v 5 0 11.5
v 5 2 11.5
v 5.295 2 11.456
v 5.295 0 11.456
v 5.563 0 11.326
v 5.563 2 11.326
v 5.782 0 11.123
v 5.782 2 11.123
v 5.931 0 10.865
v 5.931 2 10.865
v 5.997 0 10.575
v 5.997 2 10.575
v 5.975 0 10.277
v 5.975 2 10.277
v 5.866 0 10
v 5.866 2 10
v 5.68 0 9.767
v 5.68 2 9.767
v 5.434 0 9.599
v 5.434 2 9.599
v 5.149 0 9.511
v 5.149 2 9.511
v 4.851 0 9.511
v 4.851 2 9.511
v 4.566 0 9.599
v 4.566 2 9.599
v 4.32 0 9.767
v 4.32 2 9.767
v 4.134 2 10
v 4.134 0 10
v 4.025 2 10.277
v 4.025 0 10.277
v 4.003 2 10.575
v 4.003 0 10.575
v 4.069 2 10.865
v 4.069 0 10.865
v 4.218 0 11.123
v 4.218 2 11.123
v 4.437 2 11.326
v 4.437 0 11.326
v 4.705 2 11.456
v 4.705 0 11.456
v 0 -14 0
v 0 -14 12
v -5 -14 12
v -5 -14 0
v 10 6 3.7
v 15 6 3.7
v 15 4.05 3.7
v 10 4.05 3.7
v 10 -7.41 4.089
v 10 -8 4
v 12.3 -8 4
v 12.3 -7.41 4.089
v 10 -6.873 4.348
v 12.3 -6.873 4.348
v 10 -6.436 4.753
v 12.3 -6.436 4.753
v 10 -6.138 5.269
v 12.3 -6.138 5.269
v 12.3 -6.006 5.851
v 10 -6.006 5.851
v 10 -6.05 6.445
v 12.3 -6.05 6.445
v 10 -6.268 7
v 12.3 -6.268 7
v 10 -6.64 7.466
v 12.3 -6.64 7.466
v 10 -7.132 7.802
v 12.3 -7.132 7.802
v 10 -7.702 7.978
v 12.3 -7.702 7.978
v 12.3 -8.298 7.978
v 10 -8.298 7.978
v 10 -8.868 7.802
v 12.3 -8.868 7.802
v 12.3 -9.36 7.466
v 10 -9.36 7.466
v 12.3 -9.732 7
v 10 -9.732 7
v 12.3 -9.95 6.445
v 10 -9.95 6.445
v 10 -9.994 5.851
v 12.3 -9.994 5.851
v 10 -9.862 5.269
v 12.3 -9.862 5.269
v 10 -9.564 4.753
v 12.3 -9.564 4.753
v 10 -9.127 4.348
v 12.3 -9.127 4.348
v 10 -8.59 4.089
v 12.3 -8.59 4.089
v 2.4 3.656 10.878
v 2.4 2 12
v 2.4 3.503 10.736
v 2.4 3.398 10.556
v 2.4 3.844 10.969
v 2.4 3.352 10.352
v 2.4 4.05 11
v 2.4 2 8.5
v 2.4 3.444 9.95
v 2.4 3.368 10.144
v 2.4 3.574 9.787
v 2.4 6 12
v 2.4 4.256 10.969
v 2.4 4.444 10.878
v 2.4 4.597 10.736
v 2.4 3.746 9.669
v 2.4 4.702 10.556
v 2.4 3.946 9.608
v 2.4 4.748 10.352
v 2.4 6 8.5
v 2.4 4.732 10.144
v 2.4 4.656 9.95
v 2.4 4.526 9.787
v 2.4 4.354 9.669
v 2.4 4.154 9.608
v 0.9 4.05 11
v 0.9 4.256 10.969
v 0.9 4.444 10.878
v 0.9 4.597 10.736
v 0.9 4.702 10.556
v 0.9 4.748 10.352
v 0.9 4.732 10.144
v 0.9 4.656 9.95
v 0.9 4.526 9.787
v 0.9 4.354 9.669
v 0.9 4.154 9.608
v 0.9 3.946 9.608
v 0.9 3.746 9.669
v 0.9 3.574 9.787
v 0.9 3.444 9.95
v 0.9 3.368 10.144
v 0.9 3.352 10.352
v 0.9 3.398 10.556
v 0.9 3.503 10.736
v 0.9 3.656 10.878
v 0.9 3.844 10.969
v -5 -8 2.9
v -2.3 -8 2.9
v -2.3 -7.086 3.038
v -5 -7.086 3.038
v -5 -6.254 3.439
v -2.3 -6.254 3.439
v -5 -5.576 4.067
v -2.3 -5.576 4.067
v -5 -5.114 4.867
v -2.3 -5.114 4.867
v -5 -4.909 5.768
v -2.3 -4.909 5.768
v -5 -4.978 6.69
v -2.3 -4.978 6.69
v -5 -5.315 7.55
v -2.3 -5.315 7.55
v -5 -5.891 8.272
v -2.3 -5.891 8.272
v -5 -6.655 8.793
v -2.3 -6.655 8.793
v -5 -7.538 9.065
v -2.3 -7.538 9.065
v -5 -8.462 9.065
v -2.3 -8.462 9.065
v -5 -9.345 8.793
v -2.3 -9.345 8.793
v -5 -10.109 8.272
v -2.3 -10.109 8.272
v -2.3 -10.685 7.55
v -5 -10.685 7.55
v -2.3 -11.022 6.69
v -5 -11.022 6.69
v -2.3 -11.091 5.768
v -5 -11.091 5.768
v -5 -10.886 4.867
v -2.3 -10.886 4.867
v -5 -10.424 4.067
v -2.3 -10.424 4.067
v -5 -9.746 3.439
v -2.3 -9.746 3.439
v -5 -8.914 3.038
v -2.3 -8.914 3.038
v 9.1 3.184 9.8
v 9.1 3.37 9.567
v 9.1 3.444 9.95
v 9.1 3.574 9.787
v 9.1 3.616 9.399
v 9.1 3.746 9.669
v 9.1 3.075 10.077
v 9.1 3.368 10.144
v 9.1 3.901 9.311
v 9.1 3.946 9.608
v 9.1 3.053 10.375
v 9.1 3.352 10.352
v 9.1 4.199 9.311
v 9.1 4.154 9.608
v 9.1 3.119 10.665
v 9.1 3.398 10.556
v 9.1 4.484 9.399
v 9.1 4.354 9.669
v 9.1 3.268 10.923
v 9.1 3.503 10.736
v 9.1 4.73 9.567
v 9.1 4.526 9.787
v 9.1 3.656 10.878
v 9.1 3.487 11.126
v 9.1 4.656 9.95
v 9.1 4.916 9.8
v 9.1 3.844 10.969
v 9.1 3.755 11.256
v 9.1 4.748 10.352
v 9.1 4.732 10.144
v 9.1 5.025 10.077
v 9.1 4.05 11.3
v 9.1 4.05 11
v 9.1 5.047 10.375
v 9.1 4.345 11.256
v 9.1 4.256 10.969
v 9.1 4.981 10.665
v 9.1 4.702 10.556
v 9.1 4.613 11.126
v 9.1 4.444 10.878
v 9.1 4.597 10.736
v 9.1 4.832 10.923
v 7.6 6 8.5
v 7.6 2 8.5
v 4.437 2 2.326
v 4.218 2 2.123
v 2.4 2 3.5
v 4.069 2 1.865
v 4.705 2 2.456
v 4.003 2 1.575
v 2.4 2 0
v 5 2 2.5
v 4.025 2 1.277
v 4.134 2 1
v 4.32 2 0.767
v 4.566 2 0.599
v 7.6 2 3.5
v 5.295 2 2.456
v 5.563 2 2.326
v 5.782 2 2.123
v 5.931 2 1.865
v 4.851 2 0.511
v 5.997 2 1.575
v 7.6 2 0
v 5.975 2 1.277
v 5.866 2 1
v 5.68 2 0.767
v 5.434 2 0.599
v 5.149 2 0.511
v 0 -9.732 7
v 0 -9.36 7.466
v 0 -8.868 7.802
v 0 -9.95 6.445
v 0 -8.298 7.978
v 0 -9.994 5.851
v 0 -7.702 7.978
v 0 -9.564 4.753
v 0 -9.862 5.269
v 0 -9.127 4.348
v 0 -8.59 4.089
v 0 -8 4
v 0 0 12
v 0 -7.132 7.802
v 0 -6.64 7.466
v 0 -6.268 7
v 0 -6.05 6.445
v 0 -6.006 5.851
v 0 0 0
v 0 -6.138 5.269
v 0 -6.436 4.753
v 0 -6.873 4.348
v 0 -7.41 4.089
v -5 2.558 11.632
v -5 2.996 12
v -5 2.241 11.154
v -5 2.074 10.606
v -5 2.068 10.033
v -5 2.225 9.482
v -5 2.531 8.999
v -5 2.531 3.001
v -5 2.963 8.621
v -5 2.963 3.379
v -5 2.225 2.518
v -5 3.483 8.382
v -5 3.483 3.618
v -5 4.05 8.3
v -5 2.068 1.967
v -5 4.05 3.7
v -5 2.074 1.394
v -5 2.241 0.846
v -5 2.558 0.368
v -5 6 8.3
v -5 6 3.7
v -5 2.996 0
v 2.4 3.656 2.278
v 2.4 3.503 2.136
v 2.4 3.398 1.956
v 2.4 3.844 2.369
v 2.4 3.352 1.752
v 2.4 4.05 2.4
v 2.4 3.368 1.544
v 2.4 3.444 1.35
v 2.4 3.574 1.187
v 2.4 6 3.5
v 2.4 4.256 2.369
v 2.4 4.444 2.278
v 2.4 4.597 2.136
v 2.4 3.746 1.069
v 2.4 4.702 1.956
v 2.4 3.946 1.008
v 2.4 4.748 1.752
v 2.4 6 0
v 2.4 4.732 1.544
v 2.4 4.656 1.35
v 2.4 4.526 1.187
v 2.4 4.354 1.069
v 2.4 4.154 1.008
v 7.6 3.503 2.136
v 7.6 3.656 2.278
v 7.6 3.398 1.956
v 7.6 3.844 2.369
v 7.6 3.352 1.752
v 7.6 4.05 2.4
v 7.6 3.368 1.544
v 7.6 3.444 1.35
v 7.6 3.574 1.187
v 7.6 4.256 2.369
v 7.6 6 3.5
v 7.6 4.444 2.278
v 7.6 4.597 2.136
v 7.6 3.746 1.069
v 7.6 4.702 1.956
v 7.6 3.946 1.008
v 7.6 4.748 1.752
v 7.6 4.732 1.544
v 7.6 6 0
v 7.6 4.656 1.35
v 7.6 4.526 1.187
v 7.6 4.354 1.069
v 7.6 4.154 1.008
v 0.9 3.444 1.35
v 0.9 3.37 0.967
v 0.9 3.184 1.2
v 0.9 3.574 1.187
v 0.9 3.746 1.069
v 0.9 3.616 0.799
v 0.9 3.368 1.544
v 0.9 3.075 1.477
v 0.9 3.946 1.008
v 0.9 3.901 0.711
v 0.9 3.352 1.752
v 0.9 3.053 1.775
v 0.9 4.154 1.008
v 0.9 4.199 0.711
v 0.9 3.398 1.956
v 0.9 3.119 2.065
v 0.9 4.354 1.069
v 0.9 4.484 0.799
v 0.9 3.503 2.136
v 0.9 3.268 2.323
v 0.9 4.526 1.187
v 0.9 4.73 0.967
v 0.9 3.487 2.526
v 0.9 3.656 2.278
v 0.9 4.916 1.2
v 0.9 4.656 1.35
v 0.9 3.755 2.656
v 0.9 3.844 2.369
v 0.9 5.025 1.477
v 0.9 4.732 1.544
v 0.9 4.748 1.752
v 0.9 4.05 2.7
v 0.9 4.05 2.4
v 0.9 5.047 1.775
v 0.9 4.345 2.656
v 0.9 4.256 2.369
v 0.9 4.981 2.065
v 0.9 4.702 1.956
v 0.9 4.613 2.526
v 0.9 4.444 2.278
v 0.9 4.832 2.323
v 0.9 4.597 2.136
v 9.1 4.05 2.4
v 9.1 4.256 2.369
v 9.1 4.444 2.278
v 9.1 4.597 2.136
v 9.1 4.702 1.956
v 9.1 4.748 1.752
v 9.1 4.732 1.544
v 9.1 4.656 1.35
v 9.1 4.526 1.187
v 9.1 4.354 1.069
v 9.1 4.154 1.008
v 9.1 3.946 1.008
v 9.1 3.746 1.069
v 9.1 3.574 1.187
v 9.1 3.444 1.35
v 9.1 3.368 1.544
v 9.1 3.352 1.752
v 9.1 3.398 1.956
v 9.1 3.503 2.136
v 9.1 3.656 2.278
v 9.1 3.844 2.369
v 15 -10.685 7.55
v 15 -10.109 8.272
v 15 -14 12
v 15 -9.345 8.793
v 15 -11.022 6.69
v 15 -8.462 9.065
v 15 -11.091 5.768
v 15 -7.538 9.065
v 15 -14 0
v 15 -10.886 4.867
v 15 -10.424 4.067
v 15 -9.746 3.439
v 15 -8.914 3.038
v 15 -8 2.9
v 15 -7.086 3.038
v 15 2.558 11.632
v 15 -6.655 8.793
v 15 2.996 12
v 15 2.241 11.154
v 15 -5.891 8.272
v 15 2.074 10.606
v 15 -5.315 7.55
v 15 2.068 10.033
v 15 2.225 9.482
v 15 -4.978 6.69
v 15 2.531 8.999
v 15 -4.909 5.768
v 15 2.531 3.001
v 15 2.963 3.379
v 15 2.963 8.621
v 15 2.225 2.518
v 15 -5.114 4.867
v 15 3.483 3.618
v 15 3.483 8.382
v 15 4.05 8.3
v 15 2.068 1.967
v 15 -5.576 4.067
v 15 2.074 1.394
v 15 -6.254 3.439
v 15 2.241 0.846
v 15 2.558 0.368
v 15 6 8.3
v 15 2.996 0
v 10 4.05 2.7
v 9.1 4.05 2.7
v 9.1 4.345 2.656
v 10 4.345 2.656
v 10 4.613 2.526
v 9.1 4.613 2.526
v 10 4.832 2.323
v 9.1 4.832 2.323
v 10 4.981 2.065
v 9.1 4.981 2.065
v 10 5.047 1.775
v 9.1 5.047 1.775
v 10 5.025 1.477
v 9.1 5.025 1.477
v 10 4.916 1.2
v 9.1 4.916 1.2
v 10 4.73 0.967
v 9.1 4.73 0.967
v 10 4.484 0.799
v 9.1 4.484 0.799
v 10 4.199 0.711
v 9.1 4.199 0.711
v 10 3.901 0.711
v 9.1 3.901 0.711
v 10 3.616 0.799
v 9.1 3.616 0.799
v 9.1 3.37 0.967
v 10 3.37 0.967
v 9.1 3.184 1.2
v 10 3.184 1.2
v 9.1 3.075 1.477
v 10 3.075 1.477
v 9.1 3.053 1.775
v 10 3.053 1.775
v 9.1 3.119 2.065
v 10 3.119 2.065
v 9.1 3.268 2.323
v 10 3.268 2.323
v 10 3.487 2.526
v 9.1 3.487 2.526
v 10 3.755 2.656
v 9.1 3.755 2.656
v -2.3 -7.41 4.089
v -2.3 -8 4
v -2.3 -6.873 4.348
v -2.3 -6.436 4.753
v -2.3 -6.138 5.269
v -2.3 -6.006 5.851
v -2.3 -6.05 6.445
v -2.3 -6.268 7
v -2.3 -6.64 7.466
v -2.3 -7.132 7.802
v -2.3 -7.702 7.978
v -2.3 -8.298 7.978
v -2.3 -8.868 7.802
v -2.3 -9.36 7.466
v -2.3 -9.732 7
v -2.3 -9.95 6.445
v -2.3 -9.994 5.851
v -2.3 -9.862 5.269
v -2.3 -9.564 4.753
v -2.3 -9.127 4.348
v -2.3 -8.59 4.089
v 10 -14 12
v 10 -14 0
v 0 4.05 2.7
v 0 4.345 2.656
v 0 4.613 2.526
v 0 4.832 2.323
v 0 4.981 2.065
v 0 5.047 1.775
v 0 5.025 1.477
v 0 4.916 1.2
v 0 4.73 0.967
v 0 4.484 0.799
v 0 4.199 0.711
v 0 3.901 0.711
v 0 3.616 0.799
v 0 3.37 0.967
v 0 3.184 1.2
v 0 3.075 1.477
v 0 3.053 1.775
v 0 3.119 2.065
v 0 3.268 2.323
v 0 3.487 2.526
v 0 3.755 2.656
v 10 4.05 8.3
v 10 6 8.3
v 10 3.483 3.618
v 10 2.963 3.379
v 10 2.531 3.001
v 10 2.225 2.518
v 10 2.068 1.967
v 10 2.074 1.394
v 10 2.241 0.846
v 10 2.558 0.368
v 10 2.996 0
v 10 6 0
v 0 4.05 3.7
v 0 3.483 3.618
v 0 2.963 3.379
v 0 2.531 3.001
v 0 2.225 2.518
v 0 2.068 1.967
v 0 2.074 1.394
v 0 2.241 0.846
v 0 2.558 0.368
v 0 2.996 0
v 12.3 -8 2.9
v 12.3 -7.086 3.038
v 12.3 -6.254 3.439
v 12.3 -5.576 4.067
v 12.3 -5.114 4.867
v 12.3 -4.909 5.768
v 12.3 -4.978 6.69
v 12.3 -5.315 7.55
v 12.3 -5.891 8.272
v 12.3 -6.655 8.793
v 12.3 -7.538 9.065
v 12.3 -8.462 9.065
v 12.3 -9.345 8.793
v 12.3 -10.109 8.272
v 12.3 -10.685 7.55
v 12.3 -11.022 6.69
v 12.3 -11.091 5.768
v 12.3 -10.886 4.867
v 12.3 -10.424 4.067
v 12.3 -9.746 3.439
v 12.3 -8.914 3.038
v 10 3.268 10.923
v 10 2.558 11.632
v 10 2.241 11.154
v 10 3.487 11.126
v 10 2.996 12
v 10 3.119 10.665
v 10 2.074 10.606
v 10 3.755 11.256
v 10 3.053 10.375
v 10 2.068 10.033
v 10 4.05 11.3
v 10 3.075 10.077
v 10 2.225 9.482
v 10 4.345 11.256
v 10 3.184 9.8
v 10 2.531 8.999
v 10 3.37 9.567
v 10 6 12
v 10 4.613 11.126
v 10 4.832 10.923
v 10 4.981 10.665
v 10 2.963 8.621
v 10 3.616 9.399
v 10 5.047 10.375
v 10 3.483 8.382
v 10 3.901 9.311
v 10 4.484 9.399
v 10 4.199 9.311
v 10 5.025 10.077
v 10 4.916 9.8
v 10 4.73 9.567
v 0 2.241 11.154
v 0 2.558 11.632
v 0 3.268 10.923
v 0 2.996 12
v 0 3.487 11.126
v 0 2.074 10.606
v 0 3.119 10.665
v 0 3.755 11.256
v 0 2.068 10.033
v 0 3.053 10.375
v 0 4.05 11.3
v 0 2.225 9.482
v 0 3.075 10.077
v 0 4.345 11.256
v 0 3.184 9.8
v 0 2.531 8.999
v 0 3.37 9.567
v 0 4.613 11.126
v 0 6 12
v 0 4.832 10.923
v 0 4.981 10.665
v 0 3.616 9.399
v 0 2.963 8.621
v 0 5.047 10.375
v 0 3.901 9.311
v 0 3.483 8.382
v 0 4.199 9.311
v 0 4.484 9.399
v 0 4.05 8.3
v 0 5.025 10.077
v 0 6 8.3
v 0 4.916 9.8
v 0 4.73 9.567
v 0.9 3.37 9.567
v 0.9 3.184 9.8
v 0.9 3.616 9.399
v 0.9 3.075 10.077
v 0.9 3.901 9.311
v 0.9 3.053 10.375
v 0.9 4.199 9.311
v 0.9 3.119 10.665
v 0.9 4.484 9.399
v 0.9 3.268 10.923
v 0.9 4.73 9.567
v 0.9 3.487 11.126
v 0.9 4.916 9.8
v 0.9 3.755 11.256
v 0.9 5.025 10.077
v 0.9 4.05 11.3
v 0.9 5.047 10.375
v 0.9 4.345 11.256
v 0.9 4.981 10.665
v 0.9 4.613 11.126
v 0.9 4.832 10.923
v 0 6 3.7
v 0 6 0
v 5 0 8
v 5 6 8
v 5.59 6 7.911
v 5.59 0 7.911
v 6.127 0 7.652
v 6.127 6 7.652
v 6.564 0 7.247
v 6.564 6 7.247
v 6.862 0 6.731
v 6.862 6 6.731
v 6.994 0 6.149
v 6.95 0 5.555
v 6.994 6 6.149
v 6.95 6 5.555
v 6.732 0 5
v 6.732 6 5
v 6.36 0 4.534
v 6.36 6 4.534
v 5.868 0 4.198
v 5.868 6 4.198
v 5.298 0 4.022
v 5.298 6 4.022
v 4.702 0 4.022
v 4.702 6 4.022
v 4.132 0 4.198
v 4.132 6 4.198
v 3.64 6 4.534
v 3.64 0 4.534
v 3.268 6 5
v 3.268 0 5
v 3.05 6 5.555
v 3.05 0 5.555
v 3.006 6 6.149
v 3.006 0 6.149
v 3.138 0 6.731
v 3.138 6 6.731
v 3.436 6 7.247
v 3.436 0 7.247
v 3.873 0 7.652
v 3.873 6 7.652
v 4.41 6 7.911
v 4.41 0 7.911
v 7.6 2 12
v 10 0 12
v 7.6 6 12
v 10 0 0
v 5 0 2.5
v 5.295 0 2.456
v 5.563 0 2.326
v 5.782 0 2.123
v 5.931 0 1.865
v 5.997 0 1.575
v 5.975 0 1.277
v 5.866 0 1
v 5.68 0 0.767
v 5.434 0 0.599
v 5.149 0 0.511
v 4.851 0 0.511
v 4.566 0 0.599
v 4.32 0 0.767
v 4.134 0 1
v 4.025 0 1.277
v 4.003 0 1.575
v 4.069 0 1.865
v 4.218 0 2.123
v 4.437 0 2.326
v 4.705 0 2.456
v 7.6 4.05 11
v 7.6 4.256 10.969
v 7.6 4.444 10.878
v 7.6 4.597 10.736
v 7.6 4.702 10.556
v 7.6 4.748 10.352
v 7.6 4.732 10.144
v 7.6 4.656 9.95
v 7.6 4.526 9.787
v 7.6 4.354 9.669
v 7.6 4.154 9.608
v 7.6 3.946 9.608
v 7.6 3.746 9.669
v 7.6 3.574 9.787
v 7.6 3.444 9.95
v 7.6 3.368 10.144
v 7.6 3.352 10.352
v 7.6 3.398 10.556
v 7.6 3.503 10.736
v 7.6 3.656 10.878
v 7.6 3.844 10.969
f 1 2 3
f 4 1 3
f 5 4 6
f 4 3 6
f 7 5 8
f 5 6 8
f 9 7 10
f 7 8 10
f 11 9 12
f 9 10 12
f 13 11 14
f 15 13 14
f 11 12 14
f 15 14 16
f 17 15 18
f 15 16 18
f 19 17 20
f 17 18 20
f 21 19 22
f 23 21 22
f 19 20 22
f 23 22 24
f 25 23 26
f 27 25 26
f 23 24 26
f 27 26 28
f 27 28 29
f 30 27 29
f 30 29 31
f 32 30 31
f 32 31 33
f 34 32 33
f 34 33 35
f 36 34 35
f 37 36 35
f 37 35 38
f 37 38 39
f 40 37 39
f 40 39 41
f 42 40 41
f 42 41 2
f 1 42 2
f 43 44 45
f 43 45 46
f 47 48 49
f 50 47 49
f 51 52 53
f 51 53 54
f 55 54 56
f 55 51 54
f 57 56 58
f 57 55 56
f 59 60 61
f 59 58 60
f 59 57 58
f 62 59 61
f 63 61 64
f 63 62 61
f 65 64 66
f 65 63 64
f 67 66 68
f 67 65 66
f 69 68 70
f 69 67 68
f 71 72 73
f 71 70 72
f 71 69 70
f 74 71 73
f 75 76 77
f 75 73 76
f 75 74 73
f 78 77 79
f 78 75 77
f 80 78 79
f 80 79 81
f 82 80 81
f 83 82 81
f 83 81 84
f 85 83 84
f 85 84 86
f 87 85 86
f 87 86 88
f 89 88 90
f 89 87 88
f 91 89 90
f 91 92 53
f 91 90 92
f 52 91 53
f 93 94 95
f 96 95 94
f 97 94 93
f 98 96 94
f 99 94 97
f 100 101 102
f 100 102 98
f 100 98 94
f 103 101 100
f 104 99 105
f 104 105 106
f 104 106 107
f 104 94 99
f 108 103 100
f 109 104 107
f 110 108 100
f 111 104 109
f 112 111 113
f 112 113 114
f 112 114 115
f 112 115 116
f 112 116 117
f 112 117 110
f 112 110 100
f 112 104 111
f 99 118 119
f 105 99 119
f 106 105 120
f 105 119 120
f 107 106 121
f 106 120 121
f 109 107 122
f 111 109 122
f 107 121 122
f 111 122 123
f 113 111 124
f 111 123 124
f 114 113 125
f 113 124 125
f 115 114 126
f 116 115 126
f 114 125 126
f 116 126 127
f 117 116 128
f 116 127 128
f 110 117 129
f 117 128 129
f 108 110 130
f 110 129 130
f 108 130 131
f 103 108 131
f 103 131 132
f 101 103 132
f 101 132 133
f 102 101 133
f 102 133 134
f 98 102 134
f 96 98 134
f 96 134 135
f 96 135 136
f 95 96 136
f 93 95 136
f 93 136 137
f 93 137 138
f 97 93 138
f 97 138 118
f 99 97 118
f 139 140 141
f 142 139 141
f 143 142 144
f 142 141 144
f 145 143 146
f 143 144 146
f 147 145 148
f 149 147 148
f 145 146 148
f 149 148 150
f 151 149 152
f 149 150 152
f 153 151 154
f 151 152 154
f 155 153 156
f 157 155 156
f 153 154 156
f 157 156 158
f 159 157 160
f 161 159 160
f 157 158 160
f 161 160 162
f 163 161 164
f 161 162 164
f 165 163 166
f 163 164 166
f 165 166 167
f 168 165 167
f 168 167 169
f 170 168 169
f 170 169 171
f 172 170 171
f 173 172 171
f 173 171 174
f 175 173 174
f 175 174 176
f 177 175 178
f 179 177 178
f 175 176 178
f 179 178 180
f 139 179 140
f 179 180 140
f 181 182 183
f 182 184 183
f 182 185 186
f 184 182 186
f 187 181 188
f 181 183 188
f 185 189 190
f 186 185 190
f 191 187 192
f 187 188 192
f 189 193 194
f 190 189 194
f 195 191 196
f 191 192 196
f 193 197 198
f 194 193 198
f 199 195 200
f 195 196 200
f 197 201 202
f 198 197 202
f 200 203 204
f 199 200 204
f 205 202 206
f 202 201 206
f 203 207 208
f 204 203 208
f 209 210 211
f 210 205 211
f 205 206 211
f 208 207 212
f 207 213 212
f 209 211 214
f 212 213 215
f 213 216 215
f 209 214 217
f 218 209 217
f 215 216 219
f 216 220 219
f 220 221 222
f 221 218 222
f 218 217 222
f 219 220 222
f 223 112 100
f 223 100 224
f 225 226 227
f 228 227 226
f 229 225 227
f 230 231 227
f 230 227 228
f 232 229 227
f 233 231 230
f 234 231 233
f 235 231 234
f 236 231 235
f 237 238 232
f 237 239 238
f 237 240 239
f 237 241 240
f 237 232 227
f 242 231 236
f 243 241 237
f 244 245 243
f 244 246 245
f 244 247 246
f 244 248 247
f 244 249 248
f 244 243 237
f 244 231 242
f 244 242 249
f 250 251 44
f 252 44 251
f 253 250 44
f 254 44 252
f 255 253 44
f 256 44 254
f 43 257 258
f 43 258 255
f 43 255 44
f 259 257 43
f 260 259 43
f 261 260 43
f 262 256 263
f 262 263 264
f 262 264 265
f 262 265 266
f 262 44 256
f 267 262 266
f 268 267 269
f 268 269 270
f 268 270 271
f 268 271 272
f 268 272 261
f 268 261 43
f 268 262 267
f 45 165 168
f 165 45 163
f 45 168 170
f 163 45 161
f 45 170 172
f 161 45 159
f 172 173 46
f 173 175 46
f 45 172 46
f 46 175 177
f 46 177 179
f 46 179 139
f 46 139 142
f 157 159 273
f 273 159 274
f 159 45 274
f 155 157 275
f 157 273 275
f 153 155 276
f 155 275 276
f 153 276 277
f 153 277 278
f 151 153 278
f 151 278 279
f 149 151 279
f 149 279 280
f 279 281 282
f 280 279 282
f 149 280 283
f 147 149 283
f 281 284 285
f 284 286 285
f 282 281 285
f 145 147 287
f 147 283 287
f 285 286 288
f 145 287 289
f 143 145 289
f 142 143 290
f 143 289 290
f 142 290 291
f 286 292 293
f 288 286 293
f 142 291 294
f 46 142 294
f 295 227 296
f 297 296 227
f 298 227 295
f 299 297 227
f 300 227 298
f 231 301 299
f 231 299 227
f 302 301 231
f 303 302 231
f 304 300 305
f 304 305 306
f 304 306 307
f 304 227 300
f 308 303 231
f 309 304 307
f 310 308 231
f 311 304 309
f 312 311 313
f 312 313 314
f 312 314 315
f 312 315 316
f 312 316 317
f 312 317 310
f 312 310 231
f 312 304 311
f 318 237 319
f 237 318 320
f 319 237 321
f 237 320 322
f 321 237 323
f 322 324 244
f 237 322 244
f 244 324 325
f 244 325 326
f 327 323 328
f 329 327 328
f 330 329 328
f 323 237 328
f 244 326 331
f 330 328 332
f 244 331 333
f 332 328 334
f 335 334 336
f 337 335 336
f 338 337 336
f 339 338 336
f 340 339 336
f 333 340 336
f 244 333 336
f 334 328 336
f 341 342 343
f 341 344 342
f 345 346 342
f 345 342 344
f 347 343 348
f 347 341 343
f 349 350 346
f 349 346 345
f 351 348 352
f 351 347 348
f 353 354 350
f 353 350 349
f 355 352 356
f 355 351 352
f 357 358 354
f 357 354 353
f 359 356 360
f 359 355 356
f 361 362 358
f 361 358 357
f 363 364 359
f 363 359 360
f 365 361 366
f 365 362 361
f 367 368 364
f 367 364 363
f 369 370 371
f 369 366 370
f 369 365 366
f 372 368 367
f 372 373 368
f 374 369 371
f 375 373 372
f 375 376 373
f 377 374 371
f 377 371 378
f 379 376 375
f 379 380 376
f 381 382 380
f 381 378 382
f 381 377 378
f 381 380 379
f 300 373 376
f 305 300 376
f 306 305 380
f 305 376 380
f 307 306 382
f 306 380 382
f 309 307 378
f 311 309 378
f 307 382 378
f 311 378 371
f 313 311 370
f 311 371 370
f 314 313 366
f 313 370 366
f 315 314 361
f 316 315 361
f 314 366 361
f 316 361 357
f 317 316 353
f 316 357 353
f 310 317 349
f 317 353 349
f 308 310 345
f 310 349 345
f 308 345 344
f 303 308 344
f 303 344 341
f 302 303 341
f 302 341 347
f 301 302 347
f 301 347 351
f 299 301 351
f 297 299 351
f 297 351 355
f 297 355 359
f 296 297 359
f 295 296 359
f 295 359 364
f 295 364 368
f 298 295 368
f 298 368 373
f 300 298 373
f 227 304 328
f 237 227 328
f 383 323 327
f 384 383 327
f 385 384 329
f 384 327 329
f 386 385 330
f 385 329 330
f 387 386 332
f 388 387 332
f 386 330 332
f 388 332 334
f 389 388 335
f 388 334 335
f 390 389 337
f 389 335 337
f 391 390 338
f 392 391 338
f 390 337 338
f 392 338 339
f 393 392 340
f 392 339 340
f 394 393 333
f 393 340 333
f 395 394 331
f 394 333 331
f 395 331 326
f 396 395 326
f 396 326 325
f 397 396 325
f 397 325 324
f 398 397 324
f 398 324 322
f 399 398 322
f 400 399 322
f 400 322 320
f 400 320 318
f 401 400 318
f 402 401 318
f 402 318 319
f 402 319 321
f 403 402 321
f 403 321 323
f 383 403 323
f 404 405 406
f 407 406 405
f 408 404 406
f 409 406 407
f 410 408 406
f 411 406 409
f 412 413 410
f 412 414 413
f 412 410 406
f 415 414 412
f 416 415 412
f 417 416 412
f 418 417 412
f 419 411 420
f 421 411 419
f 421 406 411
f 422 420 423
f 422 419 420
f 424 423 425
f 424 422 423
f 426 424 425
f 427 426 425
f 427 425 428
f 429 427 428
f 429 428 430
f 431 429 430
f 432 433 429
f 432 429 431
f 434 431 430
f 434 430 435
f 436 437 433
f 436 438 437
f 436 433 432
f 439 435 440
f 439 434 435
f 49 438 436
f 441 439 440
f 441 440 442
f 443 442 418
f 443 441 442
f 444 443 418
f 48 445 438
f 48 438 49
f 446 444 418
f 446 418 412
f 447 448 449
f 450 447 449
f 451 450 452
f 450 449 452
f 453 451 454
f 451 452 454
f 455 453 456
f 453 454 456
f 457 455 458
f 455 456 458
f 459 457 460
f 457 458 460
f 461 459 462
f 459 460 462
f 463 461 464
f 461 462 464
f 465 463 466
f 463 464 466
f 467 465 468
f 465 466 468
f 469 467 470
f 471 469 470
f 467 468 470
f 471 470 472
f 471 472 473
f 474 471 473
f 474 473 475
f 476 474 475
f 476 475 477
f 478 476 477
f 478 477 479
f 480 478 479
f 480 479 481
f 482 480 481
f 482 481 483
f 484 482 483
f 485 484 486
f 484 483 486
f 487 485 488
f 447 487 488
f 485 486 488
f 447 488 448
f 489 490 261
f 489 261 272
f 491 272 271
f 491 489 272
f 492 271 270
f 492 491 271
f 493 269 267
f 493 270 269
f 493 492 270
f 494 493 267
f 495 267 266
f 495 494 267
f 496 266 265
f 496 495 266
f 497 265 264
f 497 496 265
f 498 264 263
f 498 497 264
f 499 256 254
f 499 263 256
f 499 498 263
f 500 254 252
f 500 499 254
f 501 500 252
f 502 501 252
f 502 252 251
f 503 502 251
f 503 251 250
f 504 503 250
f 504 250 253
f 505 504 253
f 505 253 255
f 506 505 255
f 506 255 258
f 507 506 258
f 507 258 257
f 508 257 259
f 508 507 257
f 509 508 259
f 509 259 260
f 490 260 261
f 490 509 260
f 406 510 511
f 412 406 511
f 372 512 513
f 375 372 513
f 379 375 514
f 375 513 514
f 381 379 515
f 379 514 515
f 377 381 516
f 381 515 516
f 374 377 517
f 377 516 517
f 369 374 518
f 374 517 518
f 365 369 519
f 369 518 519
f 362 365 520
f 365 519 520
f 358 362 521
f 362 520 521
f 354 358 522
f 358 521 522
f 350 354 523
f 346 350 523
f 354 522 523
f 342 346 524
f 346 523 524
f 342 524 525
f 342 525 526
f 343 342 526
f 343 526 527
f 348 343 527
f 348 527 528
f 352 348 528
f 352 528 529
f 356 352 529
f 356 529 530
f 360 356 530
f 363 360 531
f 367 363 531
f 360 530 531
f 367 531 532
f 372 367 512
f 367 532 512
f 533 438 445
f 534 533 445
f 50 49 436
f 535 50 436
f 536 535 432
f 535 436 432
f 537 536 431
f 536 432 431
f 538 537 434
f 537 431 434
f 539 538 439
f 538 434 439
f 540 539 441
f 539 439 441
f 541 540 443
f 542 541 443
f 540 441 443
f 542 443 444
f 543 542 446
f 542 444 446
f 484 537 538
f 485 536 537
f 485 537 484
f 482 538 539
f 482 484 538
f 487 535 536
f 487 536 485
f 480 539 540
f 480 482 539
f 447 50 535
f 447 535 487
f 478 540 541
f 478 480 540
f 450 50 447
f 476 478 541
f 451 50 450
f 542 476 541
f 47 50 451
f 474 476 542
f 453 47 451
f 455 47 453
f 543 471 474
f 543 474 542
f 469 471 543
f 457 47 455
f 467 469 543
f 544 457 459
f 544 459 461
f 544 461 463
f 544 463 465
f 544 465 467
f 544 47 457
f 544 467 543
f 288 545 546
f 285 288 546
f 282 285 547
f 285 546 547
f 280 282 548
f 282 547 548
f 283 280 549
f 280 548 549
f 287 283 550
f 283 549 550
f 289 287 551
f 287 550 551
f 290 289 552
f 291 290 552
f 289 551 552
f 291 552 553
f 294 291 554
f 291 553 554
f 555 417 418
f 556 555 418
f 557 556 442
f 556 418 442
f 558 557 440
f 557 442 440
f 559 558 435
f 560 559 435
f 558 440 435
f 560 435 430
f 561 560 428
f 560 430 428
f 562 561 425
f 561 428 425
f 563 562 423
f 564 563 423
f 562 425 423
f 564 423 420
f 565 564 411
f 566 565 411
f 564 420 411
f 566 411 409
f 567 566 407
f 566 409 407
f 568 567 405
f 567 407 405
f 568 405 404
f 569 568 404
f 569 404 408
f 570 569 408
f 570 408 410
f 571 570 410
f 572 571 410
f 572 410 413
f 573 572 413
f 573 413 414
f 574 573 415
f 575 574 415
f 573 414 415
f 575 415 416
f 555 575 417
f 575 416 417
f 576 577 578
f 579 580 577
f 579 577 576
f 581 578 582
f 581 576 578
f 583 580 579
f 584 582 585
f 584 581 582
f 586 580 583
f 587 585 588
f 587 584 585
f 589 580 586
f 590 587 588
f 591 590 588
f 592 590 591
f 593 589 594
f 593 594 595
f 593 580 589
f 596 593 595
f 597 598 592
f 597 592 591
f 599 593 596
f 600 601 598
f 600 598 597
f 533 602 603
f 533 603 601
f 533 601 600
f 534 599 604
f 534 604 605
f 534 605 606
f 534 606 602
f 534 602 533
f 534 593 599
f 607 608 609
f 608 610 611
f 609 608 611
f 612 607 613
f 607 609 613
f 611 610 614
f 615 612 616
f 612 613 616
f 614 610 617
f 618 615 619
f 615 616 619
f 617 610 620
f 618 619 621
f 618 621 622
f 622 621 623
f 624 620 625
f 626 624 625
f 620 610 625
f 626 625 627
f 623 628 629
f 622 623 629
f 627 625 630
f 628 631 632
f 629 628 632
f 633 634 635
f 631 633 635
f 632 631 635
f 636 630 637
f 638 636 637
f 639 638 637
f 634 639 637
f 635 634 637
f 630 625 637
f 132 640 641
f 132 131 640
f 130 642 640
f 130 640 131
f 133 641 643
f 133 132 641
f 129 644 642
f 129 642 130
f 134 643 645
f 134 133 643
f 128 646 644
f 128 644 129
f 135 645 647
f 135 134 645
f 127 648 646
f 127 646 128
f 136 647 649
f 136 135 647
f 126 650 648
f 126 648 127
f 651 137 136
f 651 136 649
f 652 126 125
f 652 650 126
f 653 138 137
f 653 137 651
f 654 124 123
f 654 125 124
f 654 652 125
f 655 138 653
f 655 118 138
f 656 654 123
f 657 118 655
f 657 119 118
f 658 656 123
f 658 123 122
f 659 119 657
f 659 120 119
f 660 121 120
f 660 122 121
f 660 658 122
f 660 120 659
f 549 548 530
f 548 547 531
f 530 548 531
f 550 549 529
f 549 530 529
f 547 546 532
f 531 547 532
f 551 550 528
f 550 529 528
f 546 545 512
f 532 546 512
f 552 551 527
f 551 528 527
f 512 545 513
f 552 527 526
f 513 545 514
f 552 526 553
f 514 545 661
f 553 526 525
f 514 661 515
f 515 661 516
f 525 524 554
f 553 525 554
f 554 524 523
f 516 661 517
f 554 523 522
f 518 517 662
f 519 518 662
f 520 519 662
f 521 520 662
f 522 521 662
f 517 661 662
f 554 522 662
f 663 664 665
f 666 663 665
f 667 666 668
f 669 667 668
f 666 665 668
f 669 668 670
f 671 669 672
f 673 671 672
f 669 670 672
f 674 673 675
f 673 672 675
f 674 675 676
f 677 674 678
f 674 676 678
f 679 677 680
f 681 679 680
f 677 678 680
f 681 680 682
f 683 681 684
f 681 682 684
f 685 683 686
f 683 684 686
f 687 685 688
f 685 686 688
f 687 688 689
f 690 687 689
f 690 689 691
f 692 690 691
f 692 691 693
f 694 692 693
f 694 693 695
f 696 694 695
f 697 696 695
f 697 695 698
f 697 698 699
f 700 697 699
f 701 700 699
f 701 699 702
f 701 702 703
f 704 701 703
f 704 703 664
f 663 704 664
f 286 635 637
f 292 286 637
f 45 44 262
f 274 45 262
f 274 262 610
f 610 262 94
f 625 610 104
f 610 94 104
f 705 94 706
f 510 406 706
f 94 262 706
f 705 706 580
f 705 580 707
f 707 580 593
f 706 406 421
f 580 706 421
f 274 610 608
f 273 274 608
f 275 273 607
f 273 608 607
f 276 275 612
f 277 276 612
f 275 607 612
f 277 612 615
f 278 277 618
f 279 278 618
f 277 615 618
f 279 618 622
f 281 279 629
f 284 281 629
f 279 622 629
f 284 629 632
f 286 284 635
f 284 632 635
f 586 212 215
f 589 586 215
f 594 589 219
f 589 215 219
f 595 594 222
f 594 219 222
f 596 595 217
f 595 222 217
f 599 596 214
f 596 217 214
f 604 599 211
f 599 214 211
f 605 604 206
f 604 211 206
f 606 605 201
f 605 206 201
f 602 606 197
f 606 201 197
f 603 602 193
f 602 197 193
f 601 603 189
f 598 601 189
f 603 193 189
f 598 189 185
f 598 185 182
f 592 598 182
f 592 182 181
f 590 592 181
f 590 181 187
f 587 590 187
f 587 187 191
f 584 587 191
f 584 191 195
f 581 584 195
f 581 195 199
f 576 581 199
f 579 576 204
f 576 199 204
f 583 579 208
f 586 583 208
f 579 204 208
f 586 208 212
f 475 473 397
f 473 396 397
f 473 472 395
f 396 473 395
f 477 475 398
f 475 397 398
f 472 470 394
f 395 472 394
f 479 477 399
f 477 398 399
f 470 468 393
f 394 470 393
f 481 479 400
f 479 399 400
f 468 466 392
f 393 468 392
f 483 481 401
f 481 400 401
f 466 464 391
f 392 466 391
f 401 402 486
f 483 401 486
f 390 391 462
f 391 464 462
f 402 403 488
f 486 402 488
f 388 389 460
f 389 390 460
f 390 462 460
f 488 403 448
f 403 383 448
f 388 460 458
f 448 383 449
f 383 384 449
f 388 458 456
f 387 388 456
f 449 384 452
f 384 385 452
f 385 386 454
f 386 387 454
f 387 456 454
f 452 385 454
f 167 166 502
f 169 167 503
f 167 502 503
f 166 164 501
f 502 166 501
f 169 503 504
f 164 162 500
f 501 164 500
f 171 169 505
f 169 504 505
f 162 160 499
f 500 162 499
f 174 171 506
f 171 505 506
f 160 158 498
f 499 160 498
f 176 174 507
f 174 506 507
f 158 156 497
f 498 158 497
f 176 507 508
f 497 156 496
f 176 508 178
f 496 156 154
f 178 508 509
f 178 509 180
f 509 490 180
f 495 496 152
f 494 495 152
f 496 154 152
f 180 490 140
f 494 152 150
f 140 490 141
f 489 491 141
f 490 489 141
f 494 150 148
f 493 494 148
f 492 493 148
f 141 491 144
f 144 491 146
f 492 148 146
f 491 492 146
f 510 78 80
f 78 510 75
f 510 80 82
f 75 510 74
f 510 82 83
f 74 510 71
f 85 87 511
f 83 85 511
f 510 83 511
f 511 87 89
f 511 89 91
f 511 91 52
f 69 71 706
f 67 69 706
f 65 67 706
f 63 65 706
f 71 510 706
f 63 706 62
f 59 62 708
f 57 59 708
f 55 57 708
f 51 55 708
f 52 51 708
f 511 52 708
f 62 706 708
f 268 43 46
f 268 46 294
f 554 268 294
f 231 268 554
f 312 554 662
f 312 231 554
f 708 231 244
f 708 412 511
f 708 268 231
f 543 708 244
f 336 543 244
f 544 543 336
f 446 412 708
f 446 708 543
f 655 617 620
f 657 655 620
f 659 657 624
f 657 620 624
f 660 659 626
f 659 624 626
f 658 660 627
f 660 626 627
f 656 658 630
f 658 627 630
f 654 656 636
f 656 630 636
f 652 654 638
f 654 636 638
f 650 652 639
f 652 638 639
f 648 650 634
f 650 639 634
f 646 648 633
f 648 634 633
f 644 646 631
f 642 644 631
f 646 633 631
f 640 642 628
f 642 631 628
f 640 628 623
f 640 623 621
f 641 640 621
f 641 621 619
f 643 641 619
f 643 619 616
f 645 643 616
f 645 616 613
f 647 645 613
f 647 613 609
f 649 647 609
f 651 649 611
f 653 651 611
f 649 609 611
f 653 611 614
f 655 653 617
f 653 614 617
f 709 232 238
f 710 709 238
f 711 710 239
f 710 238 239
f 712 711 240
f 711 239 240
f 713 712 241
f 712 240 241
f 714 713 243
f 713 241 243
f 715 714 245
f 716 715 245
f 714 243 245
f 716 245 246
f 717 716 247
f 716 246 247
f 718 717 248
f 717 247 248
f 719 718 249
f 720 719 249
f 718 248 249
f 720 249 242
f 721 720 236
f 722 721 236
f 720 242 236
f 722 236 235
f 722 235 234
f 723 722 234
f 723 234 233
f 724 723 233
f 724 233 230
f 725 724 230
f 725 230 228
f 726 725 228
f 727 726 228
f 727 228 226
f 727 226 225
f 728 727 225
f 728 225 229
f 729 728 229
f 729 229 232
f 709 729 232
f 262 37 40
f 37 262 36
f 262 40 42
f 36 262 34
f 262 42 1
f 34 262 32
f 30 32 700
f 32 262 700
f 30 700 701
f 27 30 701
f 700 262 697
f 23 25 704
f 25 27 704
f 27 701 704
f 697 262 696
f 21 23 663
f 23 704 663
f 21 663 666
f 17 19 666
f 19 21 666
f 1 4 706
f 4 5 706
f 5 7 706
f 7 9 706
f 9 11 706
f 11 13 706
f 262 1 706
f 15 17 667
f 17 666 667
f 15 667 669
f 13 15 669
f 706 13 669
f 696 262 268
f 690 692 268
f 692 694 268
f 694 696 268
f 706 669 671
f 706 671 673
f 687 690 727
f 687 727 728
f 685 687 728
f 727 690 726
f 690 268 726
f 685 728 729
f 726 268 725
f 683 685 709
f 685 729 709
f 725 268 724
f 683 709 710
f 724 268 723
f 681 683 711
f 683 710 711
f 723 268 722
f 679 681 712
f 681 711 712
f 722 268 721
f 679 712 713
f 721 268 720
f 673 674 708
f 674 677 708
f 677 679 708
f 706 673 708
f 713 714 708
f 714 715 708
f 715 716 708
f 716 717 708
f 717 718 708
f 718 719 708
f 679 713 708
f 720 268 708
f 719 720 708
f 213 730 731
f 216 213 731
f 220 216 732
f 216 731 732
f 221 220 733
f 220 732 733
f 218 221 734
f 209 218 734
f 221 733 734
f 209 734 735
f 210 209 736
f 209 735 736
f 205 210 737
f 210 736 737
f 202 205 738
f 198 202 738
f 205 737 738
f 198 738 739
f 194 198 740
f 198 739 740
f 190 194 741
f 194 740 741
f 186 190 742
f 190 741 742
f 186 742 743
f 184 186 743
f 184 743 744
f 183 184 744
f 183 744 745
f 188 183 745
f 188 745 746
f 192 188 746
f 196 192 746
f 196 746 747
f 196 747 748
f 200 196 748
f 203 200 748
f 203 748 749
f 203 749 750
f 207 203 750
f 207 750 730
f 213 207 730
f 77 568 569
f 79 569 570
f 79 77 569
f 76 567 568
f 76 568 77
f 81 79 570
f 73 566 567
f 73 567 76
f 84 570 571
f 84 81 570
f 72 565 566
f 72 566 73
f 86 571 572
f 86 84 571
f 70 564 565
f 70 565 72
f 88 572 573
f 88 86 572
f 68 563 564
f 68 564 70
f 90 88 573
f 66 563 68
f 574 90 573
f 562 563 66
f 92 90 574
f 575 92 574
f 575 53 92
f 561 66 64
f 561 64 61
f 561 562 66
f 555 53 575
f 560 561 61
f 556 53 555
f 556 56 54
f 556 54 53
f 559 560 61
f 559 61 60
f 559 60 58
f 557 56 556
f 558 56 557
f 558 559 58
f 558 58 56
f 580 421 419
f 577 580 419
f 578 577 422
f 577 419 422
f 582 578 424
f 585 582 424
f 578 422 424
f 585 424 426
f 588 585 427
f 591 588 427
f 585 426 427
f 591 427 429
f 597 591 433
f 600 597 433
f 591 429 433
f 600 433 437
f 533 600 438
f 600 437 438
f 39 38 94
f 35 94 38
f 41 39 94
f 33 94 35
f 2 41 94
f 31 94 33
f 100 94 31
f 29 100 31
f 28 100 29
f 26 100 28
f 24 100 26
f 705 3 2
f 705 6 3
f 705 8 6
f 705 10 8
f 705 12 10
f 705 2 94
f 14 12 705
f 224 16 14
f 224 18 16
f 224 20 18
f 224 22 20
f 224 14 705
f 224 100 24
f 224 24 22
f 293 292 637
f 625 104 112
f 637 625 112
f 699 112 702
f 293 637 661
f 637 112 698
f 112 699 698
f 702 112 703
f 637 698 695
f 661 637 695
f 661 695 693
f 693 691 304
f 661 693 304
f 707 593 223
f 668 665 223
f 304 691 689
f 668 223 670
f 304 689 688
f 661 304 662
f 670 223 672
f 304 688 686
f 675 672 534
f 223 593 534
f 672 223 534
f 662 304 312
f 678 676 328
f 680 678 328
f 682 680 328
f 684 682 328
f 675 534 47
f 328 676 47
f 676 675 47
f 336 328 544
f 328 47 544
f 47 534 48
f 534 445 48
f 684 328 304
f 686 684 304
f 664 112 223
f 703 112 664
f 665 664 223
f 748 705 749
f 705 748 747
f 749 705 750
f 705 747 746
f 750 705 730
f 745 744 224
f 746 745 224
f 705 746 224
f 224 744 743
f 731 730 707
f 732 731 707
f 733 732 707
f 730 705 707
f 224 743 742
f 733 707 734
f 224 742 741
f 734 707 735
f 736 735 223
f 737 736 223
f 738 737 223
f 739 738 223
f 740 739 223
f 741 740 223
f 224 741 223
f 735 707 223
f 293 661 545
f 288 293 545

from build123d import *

# Parameters (mm, degrees)
SKETCH_1_W                = 10
SKETCH_1_H                = 12
EXTRUDE_1_DEPTH           = 6
SKETCH_2_R                = 1
CUT_EXTRUDE_1_DEPTH       = 17.733200531
SKETCH_2_3_R              = 2
CUT_EXTRUDE_2_DEPTH       = 4
SKETCH_3_R                = 2
CUT_EXTRUDE_3_DEPTH       = 17.733200531
SKETCH_4_W                = 5.2
SKETCH_4_H                = 3.5
CUT_EXTRUDE_4_DEPTH       = 4
SKETCH_6_R                = 0.7
CUT_EXTRUDE_5_DEPTH       = 17.733200531
SKETCH_6_3_R              = 1
CUT_EXTRUDE_6_DEPTH       = 0.9
CUT_EXTRUDE_START         = -9.1
SKETCH_6_4_R              = 1
CUT_EXTRUDE_7_DEPTH       = 0.9
SKETCH_7_W                = 12
SKETCH_7_H                = 20
EXTRUDE_2_DEPTH           = 5
CUT_EXTRUDE_START_2       = 5
CUT_EXTRUDE_8_DEPTH       = 5
EXTRUDE_START             = -10
SKETCH_7_4_W              = 12
SKETCH_7_4_H              = 20
EXTRUDE_3_DEPTH           = 5
CUT_EXTRUDE_START_3       = -10
SKETCH_7_5_R              = 1
CUT_EXTRUDE_9_DEPTH       = 5
CUT_EXTRUDE_10_DEPTH      = 24.769728648
CUT_EXTRUDE_10_DEPTH_BACK = 24.769728648
SKETCH_7_6_R              = 2
SKETCH_7_7_R              = 3.1
CUT_EXTRUDE_11_DEPTH      = 2.7
CUT_EXTRUDE_START_4       = -12.3
SKETCH_7_8_R              = 3.1
CUT_EXTRUDE_12_DEPTH      = 2.7


with BuildPart() as part:
    # 草图1 → 凸台-拉伸1 (new body)
    with BuildSketch(Plane(origin=(0, 0, 0), x_dir=(1, 0, 0), z_dir=(0, 1, 0))):
        with Locations((5, -6)):
            Rectangle(SKETCH_1_W, SKETCH_1_H)
    extrude(amount=EXTRUDE_1_DEPTH)

    # 草图2 → 切除-拉伸1 (cut, through all)
    with BuildSketch(Plane(origin=(0, 6, 0), x_dir=(1, 0, 0), z_dir=(0, 1, 0))):
        with Locations(Location((5, -1.5, 0), (0, 0, 270))):
            Circle(SKETCH_2_R)
        with Locations(Location((5, -10.5, 0), (0, 0, 270))):
            Circle(SKETCH_2_R)
    extrude(amount=-CUT_EXTRUDE_1_DEPTH, mode=Mode.SUBTRACT)

    # 草图2<3> → 切除-拉伸2 (cut)
    with BuildSketch(Plane(origin=(0, 6, 0), x_dir=(1, 0, 0), z_dir=(0, 1, 0))):
        with Locations((5, -1.5)):
            Circle(SKETCH_2_3_R)
        with Locations((5, -10.5)):
            Circle(SKETCH_2_3_R)
    extrude(amount=-CUT_EXTRUDE_2_DEPTH, mode=Mode.SUBTRACT)

    # 草图3 → 切除-拉伸3 (cut, through all)
    with BuildSketch(Plane(origin=(0, 6, 0), x_dir=(1, 0, 0), z_dir=(0, 1, 0))):
        with Locations(Location((5, -6, 0), (0, 0, 270))):
            Circle(SKETCH_3_R)
    extrude(amount=-CUT_EXTRUDE_3_DEPTH, mode=Mode.SUBTRACT)

    # 草图4 → 切除-拉伸4 (cut)
    with BuildSketch(Plane(origin=(0, 6, 0), x_dir=(1, 0, 0), z_dir=(0, 1, 0))):
        with Locations((5, -1.75)):
            Rectangle(SKETCH_4_W, SKETCH_4_H)
        with Locations((5, -10.25)):
            Rectangle(SKETCH_4_W, SKETCH_4_H)
    extrude(amount=-CUT_EXTRUDE_4_DEPTH, mode=Mode.SUBTRACT)

    # 草图6 → 切除-拉伸5 (cut, through all)
    with BuildSketch(Plane.ZY):
        with Locations((1.7, 4.05)):
            Circle(SKETCH_6_R)
        with Locations((10.3, 4.05)):
            Circle(SKETCH_6_R)
    extrude(amount=-CUT_EXTRUDE_5_DEPTH, mode=Mode.SUBTRACT)

    # 草图6<3> → 切除-拉伸6 (cut)
    with BuildSketch(Plane.ZY):
        with Locations((1.7, 4.05)):
            Circle(SKETCH_6_3_R)
        with Locations((10.3, 4.05)):
            Circle(SKETCH_6_3_R)
    extrude(amount=-CUT_EXTRUDE_6_DEPTH, mode=Mode.SUBTRACT)

    # 草图6<4> → 切除-拉伸7 (cut)
    with BuildSketch(Plane.ZY.offset(CUT_EXTRUDE_START)):
        with Locations((1.7, 4.05)):
            Circle(SKETCH_6_4_R)
        with Locations((10.3, 4.05)):
            Circle(SKETCH_6_4_R)
    extrude(amount=-CUT_EXTRUDE_7_DEPTH, mode=Mode.SUBTRACT)

    # 草图7 → 凸台-拉伸2 (add)
    with BuildSketch(Plane(origin=(10, 0, 0), x_dir=(0, 0, -1), z_dir=(1, 0, 0))):
        with Locations((-6, -4)):
            Rectangle(SKETCH_7_W, SKETCH_7_H)
    extrude(amount=EXTRUDE_2_DEPTH)

    # 草图7<3> → 切除-拉伸8 (cut)
    with BuildSketch(Plane(origin=(10, 0, 0), x_dir=(0, 0, -1), z_dir=(1, 0, 0)).offset(CUT_EXTRUDE_START_2)):
        with BuildLine():
            ThreePointArc((-8.3, 4.05), (-8.736539185, 5.297233049), (-9.855590279, 6))
            Line((-9.855590279, 6), (-10.744409721, 6))
            ThreePointArc((-10.744409721, 6), (-11.462119625, 5.677721714), (-12, 5.103565375))
            Line((-12, 5.103565375), (-12, 2.996434625))
            ThreePointArc((-12, 2.996434625), (-9.752277442, 2.126461594), (-8.3, 4.05))
        make_face()
        with BuildLine():
            ThreePointArc((-12, 5.103565375), (-11.462119625, 5.677721714), (-10.744409721, 6))
            Line((-10.744409721, 6), (-12, 6))
            Line((-12, 6), (-12, 5.103565375))
        make_face()
        with BuildLine():
            Line((-1.255590279, 6), (-2.144409721, 6))
            ThreePointArc((-2.144409721, 6), (-3.263460815, 5.297233049), (-3.7, 4.05))
            ThreePointArc((-3.7, 4.05), (-2.247722558, 2.126461594), (0, 2.996434625))
            Line((0, 2.996434625), (0, 5.103565375))
            ThreePointArc((0, 5.103565375), (-0.537880375, 5.677721714), (-1.255590279, 6))
        make_face()
        with BuildLine():
            Line((0, 6), (-1.255590279, 6))
            ThreePointArc((-1.255590279, 6), (-0.537880375, 5.677721714), (0, 5.103565375))
            Line((0, 5.103565375), (0, 6))
        make_face()
        with BuildLine():
            Line((-8.3, 4.05), (-8.3, 6))
            Line((-8.3, 6), (-9.855590279, 6))
            ThreePointArc((-9.855590279, 6), (-8.736539185, 5.297233049), (-8.3, 4.05))
        make_face()
        with BuildLine():
            Line((-2.144409721, 6), (-3.7, 6))
            Line((-3.7, 6), (-3.7, 4.05))
            ThreePointArc((-3.7, 4.05), (-3.263460815, 5.297233049), (-2.144409721, 6))
        make_face()
    extrude(amount=-CUT_EXTRUDE_8_DEPTH, mode=Mode.SUBTRACT)

    # 草图7<4> → 凸台-拉伸3 (add)
    with BuildSketch(Plane(origin=(10, 0, 0), x_dir=(0, 0, -1), z_dir=(1, 0, 0)).offset(EXTRUDE_START)):
        with Locations((-6, -4)):
            Rectangle(SKETCH_7_4_W, SKETCH_7_4_H)
    extrude(amount=-EXTRUDE_3_DEPTH)

    # 草图7<5> → 切除-拉伸9 (cut)
    # profile 1 of 8: a face of its own
    with BuildSketch(Plane(origin=(10, 0, 0), x_dir=(0, 0, -1), z_dir=(1, 0, 0)).offset(CUT_EXTRUDE_START_3)):
        with BuildLine():
            ThreePointArc((-8.3, 4.05), (-8.736539185, 5.297233049), (-9.855590279, 6))
            Line((-9.855590279, 6), (-10.744409721, 6))
            ThreePointArc((-10.744409721, 6), (-11.462119625, 5.677721714), (-12, 5.103565375))
            Line((-12, 5.103565375), (-12, 2.996434625))
            ThreePointArc((-12, 2.996434625), (-9.752277442, 2.126461594), (-8.3, 4.05))
        make_face()
        with Locations(Location((-10.3, 4.05, 0), (0, 0, 180))):
            Circle(SKETCH_7_5_R, mode=Mode.SUBTRACT)
    # profile 2 of 8: a face of its own
    with BuildSketch(Plane(origin=(10, 0, 0), x_dir=(0, 0, -1), z_dir=(1, 0, 0)).offset(CUT_EXTRUDE_START_3)):
        with BuildLine():
            Line((-8.3, 4.05), (-8.3, 6))
            Line((-8.3, 6), (-9.855590279, 6))
            ThreePointArc((-9.855590279, 6), (-8.736539185, 5.297233049), (-8.3, 4.05))
        make_face()
    # profile 3 of 8: a face of its own
    with BuildSketch(Plane(origin=(10, 0, 0), x_dir=(0, 0, -1), z_dir=(1, 0, 0)).offset(CUT_EXTRUDE_START_3)):
        with BuildLine():
            ThreePointArc((-12, 5.103565375), (-11.462119625, 5.677721714), (-10.744409721, 6))
            Line((-10.744409721, 6), (-12, 6))
            Line((-12, 6), (-12, 5.103565375))
        make_face()
    # profile 4 of 8: a face of its own
    with BuildSketch(Plane(origin=(10, 0, 0), x_dir=(0, 0, -1), z_dir=(1, 0, 0)).offset(CUT_EXTRUDE_START_3)):
        with BuildLine():
            Line((-1.255590279, 6), (-2.144409721, 6))
            ThreePointArc((-2.144409721, 6), (-3.263460815, 5.297233049), (-3.7, 4.05))
            ThreePointArc((-3.7, 4.05), (-2.247722558, 2.126461594), (0, 2.996434625))
            Line((0, 2.996434625), (0, 5.103565375))
            ThreePointArc((0, 5.103565375), (-0.537880375, 5.677721714), (-1.255590279, 6))
        make_face()
        with Locations(Location((-1.7, 4.05, 0), (0, 0, 180))):
            Circle(SKETCH_7_5_R, mode=Mode.SUBTRACT)
    # profile 5 of 8: a face of its own
    with BuildSketch(Plane(origin=(10, 0, 0), x_dir=(0, 0, -1), z_dir=(1, 0, 0)).offset(CUT_EXTRUDE_START_3)):
        with BuildLine():
            Line((-2.144409721, 6), (-3.7, 6))
            Line((-3.7, 6), (-3.7, 4.05))
            ThreePointArc((-3.7, 4.05), (-3.263460815, 5.297233049), (-2.144409721, 6))
        make_face()
    # profile 6 of 8: a face of its own
    with BuildSketch(Plane(origin=(10, 0, 0), x_dir=(0, 0, -1), z_dir=(1, 0, 0)).offset(CUT_EXTRUDE_START_3)):
        with BuildLine():
            Line((0, 6), (-1.255590279, 6))
            ThreePointArc((-1.255590279, 6), (-0.537880375, 5.677721714), (0, 5.103565375))
            Line((0, 5.103565375), (0, 6))
        make_face()
    # profile 7 of 8: a face of its own
    with BuildSketch(Plane(origin=(10, 0, 0), x_dir=(0, 0, -1), z_dir=(1, 0, 0)).offset(CUT_EXTRUDE_START_3)):
        with Locations(Location((-10.3, 4.05, 0), (0, 0, 180))):
            Circle(SKETCH_7_5_R)
    # profile 8 of 8: a face of its own
    with BuildSketch(Plane(origin=(10, 0, 0), x_dir=(0, 0, -1), z_dir=(1, 0, 0)).offset(CUT_EXTRUDE_START_3)):
        with Locations(Location((-1.7, 4.05, 0), (0, 0, 180))):
            Circle(SKETCH_7_5_R)
    extrude(amount=-CUT_EXTRUDE_9_DEPTH, mode=Mode.SUBTRACT)

    # 草图7<6> → 切除-拉伸10 (cut, two sides: drawn at the far end of the back side and taken through both)
    with BuildSketch(Plane(origin=(10, 0, 0), x_dir=(0, 0, -1), z_dir=(1, 0, 0)).offset(-CUT_EXTRUDE_10_DEPTH_BACK)):
        with Locations((-6, -8)):
            Circle(SKETCH_7_6_R)
    extrude(amount=CUT_EXTRUDE_10_DEPTH + CUT_EXTRUDE_10_DEPTH_BACK, mode=Mode.SUBTRACT)

    # 草图7<7> → 切除-拉伸11 (cut)
    with BuildSketch(Plane(origin=(10, 0, 0), x_dir=(0, 0, -1), z_dir=(1, 0, 0)).offset(CUT_EXTRUDE_START_2)):
        with Locations((-6, -8)):
            Circle(SKETCH_7_7_R)
    extrude(amount=-CUT_EXTRUDE_11_DEPTH, mode=Mode.SUBTRACT)

    # 草图7<8> → 切除-拉伸12 (cut)
    with BuildSketch(Plane(origin=(10, 0, 0), x_dir=(0, 0, -1), z_dir=(1, 0, 0)).offset(CUT_EXTRUDE_START_4)):
        with Locations((-6, -8)):
            Circle(SKETCH_7_8_R)
    extrude(amount=-CUT_EXTRUDE_12_DEPTH, mode=Mode.SUBTRACT)


solid = part.part
